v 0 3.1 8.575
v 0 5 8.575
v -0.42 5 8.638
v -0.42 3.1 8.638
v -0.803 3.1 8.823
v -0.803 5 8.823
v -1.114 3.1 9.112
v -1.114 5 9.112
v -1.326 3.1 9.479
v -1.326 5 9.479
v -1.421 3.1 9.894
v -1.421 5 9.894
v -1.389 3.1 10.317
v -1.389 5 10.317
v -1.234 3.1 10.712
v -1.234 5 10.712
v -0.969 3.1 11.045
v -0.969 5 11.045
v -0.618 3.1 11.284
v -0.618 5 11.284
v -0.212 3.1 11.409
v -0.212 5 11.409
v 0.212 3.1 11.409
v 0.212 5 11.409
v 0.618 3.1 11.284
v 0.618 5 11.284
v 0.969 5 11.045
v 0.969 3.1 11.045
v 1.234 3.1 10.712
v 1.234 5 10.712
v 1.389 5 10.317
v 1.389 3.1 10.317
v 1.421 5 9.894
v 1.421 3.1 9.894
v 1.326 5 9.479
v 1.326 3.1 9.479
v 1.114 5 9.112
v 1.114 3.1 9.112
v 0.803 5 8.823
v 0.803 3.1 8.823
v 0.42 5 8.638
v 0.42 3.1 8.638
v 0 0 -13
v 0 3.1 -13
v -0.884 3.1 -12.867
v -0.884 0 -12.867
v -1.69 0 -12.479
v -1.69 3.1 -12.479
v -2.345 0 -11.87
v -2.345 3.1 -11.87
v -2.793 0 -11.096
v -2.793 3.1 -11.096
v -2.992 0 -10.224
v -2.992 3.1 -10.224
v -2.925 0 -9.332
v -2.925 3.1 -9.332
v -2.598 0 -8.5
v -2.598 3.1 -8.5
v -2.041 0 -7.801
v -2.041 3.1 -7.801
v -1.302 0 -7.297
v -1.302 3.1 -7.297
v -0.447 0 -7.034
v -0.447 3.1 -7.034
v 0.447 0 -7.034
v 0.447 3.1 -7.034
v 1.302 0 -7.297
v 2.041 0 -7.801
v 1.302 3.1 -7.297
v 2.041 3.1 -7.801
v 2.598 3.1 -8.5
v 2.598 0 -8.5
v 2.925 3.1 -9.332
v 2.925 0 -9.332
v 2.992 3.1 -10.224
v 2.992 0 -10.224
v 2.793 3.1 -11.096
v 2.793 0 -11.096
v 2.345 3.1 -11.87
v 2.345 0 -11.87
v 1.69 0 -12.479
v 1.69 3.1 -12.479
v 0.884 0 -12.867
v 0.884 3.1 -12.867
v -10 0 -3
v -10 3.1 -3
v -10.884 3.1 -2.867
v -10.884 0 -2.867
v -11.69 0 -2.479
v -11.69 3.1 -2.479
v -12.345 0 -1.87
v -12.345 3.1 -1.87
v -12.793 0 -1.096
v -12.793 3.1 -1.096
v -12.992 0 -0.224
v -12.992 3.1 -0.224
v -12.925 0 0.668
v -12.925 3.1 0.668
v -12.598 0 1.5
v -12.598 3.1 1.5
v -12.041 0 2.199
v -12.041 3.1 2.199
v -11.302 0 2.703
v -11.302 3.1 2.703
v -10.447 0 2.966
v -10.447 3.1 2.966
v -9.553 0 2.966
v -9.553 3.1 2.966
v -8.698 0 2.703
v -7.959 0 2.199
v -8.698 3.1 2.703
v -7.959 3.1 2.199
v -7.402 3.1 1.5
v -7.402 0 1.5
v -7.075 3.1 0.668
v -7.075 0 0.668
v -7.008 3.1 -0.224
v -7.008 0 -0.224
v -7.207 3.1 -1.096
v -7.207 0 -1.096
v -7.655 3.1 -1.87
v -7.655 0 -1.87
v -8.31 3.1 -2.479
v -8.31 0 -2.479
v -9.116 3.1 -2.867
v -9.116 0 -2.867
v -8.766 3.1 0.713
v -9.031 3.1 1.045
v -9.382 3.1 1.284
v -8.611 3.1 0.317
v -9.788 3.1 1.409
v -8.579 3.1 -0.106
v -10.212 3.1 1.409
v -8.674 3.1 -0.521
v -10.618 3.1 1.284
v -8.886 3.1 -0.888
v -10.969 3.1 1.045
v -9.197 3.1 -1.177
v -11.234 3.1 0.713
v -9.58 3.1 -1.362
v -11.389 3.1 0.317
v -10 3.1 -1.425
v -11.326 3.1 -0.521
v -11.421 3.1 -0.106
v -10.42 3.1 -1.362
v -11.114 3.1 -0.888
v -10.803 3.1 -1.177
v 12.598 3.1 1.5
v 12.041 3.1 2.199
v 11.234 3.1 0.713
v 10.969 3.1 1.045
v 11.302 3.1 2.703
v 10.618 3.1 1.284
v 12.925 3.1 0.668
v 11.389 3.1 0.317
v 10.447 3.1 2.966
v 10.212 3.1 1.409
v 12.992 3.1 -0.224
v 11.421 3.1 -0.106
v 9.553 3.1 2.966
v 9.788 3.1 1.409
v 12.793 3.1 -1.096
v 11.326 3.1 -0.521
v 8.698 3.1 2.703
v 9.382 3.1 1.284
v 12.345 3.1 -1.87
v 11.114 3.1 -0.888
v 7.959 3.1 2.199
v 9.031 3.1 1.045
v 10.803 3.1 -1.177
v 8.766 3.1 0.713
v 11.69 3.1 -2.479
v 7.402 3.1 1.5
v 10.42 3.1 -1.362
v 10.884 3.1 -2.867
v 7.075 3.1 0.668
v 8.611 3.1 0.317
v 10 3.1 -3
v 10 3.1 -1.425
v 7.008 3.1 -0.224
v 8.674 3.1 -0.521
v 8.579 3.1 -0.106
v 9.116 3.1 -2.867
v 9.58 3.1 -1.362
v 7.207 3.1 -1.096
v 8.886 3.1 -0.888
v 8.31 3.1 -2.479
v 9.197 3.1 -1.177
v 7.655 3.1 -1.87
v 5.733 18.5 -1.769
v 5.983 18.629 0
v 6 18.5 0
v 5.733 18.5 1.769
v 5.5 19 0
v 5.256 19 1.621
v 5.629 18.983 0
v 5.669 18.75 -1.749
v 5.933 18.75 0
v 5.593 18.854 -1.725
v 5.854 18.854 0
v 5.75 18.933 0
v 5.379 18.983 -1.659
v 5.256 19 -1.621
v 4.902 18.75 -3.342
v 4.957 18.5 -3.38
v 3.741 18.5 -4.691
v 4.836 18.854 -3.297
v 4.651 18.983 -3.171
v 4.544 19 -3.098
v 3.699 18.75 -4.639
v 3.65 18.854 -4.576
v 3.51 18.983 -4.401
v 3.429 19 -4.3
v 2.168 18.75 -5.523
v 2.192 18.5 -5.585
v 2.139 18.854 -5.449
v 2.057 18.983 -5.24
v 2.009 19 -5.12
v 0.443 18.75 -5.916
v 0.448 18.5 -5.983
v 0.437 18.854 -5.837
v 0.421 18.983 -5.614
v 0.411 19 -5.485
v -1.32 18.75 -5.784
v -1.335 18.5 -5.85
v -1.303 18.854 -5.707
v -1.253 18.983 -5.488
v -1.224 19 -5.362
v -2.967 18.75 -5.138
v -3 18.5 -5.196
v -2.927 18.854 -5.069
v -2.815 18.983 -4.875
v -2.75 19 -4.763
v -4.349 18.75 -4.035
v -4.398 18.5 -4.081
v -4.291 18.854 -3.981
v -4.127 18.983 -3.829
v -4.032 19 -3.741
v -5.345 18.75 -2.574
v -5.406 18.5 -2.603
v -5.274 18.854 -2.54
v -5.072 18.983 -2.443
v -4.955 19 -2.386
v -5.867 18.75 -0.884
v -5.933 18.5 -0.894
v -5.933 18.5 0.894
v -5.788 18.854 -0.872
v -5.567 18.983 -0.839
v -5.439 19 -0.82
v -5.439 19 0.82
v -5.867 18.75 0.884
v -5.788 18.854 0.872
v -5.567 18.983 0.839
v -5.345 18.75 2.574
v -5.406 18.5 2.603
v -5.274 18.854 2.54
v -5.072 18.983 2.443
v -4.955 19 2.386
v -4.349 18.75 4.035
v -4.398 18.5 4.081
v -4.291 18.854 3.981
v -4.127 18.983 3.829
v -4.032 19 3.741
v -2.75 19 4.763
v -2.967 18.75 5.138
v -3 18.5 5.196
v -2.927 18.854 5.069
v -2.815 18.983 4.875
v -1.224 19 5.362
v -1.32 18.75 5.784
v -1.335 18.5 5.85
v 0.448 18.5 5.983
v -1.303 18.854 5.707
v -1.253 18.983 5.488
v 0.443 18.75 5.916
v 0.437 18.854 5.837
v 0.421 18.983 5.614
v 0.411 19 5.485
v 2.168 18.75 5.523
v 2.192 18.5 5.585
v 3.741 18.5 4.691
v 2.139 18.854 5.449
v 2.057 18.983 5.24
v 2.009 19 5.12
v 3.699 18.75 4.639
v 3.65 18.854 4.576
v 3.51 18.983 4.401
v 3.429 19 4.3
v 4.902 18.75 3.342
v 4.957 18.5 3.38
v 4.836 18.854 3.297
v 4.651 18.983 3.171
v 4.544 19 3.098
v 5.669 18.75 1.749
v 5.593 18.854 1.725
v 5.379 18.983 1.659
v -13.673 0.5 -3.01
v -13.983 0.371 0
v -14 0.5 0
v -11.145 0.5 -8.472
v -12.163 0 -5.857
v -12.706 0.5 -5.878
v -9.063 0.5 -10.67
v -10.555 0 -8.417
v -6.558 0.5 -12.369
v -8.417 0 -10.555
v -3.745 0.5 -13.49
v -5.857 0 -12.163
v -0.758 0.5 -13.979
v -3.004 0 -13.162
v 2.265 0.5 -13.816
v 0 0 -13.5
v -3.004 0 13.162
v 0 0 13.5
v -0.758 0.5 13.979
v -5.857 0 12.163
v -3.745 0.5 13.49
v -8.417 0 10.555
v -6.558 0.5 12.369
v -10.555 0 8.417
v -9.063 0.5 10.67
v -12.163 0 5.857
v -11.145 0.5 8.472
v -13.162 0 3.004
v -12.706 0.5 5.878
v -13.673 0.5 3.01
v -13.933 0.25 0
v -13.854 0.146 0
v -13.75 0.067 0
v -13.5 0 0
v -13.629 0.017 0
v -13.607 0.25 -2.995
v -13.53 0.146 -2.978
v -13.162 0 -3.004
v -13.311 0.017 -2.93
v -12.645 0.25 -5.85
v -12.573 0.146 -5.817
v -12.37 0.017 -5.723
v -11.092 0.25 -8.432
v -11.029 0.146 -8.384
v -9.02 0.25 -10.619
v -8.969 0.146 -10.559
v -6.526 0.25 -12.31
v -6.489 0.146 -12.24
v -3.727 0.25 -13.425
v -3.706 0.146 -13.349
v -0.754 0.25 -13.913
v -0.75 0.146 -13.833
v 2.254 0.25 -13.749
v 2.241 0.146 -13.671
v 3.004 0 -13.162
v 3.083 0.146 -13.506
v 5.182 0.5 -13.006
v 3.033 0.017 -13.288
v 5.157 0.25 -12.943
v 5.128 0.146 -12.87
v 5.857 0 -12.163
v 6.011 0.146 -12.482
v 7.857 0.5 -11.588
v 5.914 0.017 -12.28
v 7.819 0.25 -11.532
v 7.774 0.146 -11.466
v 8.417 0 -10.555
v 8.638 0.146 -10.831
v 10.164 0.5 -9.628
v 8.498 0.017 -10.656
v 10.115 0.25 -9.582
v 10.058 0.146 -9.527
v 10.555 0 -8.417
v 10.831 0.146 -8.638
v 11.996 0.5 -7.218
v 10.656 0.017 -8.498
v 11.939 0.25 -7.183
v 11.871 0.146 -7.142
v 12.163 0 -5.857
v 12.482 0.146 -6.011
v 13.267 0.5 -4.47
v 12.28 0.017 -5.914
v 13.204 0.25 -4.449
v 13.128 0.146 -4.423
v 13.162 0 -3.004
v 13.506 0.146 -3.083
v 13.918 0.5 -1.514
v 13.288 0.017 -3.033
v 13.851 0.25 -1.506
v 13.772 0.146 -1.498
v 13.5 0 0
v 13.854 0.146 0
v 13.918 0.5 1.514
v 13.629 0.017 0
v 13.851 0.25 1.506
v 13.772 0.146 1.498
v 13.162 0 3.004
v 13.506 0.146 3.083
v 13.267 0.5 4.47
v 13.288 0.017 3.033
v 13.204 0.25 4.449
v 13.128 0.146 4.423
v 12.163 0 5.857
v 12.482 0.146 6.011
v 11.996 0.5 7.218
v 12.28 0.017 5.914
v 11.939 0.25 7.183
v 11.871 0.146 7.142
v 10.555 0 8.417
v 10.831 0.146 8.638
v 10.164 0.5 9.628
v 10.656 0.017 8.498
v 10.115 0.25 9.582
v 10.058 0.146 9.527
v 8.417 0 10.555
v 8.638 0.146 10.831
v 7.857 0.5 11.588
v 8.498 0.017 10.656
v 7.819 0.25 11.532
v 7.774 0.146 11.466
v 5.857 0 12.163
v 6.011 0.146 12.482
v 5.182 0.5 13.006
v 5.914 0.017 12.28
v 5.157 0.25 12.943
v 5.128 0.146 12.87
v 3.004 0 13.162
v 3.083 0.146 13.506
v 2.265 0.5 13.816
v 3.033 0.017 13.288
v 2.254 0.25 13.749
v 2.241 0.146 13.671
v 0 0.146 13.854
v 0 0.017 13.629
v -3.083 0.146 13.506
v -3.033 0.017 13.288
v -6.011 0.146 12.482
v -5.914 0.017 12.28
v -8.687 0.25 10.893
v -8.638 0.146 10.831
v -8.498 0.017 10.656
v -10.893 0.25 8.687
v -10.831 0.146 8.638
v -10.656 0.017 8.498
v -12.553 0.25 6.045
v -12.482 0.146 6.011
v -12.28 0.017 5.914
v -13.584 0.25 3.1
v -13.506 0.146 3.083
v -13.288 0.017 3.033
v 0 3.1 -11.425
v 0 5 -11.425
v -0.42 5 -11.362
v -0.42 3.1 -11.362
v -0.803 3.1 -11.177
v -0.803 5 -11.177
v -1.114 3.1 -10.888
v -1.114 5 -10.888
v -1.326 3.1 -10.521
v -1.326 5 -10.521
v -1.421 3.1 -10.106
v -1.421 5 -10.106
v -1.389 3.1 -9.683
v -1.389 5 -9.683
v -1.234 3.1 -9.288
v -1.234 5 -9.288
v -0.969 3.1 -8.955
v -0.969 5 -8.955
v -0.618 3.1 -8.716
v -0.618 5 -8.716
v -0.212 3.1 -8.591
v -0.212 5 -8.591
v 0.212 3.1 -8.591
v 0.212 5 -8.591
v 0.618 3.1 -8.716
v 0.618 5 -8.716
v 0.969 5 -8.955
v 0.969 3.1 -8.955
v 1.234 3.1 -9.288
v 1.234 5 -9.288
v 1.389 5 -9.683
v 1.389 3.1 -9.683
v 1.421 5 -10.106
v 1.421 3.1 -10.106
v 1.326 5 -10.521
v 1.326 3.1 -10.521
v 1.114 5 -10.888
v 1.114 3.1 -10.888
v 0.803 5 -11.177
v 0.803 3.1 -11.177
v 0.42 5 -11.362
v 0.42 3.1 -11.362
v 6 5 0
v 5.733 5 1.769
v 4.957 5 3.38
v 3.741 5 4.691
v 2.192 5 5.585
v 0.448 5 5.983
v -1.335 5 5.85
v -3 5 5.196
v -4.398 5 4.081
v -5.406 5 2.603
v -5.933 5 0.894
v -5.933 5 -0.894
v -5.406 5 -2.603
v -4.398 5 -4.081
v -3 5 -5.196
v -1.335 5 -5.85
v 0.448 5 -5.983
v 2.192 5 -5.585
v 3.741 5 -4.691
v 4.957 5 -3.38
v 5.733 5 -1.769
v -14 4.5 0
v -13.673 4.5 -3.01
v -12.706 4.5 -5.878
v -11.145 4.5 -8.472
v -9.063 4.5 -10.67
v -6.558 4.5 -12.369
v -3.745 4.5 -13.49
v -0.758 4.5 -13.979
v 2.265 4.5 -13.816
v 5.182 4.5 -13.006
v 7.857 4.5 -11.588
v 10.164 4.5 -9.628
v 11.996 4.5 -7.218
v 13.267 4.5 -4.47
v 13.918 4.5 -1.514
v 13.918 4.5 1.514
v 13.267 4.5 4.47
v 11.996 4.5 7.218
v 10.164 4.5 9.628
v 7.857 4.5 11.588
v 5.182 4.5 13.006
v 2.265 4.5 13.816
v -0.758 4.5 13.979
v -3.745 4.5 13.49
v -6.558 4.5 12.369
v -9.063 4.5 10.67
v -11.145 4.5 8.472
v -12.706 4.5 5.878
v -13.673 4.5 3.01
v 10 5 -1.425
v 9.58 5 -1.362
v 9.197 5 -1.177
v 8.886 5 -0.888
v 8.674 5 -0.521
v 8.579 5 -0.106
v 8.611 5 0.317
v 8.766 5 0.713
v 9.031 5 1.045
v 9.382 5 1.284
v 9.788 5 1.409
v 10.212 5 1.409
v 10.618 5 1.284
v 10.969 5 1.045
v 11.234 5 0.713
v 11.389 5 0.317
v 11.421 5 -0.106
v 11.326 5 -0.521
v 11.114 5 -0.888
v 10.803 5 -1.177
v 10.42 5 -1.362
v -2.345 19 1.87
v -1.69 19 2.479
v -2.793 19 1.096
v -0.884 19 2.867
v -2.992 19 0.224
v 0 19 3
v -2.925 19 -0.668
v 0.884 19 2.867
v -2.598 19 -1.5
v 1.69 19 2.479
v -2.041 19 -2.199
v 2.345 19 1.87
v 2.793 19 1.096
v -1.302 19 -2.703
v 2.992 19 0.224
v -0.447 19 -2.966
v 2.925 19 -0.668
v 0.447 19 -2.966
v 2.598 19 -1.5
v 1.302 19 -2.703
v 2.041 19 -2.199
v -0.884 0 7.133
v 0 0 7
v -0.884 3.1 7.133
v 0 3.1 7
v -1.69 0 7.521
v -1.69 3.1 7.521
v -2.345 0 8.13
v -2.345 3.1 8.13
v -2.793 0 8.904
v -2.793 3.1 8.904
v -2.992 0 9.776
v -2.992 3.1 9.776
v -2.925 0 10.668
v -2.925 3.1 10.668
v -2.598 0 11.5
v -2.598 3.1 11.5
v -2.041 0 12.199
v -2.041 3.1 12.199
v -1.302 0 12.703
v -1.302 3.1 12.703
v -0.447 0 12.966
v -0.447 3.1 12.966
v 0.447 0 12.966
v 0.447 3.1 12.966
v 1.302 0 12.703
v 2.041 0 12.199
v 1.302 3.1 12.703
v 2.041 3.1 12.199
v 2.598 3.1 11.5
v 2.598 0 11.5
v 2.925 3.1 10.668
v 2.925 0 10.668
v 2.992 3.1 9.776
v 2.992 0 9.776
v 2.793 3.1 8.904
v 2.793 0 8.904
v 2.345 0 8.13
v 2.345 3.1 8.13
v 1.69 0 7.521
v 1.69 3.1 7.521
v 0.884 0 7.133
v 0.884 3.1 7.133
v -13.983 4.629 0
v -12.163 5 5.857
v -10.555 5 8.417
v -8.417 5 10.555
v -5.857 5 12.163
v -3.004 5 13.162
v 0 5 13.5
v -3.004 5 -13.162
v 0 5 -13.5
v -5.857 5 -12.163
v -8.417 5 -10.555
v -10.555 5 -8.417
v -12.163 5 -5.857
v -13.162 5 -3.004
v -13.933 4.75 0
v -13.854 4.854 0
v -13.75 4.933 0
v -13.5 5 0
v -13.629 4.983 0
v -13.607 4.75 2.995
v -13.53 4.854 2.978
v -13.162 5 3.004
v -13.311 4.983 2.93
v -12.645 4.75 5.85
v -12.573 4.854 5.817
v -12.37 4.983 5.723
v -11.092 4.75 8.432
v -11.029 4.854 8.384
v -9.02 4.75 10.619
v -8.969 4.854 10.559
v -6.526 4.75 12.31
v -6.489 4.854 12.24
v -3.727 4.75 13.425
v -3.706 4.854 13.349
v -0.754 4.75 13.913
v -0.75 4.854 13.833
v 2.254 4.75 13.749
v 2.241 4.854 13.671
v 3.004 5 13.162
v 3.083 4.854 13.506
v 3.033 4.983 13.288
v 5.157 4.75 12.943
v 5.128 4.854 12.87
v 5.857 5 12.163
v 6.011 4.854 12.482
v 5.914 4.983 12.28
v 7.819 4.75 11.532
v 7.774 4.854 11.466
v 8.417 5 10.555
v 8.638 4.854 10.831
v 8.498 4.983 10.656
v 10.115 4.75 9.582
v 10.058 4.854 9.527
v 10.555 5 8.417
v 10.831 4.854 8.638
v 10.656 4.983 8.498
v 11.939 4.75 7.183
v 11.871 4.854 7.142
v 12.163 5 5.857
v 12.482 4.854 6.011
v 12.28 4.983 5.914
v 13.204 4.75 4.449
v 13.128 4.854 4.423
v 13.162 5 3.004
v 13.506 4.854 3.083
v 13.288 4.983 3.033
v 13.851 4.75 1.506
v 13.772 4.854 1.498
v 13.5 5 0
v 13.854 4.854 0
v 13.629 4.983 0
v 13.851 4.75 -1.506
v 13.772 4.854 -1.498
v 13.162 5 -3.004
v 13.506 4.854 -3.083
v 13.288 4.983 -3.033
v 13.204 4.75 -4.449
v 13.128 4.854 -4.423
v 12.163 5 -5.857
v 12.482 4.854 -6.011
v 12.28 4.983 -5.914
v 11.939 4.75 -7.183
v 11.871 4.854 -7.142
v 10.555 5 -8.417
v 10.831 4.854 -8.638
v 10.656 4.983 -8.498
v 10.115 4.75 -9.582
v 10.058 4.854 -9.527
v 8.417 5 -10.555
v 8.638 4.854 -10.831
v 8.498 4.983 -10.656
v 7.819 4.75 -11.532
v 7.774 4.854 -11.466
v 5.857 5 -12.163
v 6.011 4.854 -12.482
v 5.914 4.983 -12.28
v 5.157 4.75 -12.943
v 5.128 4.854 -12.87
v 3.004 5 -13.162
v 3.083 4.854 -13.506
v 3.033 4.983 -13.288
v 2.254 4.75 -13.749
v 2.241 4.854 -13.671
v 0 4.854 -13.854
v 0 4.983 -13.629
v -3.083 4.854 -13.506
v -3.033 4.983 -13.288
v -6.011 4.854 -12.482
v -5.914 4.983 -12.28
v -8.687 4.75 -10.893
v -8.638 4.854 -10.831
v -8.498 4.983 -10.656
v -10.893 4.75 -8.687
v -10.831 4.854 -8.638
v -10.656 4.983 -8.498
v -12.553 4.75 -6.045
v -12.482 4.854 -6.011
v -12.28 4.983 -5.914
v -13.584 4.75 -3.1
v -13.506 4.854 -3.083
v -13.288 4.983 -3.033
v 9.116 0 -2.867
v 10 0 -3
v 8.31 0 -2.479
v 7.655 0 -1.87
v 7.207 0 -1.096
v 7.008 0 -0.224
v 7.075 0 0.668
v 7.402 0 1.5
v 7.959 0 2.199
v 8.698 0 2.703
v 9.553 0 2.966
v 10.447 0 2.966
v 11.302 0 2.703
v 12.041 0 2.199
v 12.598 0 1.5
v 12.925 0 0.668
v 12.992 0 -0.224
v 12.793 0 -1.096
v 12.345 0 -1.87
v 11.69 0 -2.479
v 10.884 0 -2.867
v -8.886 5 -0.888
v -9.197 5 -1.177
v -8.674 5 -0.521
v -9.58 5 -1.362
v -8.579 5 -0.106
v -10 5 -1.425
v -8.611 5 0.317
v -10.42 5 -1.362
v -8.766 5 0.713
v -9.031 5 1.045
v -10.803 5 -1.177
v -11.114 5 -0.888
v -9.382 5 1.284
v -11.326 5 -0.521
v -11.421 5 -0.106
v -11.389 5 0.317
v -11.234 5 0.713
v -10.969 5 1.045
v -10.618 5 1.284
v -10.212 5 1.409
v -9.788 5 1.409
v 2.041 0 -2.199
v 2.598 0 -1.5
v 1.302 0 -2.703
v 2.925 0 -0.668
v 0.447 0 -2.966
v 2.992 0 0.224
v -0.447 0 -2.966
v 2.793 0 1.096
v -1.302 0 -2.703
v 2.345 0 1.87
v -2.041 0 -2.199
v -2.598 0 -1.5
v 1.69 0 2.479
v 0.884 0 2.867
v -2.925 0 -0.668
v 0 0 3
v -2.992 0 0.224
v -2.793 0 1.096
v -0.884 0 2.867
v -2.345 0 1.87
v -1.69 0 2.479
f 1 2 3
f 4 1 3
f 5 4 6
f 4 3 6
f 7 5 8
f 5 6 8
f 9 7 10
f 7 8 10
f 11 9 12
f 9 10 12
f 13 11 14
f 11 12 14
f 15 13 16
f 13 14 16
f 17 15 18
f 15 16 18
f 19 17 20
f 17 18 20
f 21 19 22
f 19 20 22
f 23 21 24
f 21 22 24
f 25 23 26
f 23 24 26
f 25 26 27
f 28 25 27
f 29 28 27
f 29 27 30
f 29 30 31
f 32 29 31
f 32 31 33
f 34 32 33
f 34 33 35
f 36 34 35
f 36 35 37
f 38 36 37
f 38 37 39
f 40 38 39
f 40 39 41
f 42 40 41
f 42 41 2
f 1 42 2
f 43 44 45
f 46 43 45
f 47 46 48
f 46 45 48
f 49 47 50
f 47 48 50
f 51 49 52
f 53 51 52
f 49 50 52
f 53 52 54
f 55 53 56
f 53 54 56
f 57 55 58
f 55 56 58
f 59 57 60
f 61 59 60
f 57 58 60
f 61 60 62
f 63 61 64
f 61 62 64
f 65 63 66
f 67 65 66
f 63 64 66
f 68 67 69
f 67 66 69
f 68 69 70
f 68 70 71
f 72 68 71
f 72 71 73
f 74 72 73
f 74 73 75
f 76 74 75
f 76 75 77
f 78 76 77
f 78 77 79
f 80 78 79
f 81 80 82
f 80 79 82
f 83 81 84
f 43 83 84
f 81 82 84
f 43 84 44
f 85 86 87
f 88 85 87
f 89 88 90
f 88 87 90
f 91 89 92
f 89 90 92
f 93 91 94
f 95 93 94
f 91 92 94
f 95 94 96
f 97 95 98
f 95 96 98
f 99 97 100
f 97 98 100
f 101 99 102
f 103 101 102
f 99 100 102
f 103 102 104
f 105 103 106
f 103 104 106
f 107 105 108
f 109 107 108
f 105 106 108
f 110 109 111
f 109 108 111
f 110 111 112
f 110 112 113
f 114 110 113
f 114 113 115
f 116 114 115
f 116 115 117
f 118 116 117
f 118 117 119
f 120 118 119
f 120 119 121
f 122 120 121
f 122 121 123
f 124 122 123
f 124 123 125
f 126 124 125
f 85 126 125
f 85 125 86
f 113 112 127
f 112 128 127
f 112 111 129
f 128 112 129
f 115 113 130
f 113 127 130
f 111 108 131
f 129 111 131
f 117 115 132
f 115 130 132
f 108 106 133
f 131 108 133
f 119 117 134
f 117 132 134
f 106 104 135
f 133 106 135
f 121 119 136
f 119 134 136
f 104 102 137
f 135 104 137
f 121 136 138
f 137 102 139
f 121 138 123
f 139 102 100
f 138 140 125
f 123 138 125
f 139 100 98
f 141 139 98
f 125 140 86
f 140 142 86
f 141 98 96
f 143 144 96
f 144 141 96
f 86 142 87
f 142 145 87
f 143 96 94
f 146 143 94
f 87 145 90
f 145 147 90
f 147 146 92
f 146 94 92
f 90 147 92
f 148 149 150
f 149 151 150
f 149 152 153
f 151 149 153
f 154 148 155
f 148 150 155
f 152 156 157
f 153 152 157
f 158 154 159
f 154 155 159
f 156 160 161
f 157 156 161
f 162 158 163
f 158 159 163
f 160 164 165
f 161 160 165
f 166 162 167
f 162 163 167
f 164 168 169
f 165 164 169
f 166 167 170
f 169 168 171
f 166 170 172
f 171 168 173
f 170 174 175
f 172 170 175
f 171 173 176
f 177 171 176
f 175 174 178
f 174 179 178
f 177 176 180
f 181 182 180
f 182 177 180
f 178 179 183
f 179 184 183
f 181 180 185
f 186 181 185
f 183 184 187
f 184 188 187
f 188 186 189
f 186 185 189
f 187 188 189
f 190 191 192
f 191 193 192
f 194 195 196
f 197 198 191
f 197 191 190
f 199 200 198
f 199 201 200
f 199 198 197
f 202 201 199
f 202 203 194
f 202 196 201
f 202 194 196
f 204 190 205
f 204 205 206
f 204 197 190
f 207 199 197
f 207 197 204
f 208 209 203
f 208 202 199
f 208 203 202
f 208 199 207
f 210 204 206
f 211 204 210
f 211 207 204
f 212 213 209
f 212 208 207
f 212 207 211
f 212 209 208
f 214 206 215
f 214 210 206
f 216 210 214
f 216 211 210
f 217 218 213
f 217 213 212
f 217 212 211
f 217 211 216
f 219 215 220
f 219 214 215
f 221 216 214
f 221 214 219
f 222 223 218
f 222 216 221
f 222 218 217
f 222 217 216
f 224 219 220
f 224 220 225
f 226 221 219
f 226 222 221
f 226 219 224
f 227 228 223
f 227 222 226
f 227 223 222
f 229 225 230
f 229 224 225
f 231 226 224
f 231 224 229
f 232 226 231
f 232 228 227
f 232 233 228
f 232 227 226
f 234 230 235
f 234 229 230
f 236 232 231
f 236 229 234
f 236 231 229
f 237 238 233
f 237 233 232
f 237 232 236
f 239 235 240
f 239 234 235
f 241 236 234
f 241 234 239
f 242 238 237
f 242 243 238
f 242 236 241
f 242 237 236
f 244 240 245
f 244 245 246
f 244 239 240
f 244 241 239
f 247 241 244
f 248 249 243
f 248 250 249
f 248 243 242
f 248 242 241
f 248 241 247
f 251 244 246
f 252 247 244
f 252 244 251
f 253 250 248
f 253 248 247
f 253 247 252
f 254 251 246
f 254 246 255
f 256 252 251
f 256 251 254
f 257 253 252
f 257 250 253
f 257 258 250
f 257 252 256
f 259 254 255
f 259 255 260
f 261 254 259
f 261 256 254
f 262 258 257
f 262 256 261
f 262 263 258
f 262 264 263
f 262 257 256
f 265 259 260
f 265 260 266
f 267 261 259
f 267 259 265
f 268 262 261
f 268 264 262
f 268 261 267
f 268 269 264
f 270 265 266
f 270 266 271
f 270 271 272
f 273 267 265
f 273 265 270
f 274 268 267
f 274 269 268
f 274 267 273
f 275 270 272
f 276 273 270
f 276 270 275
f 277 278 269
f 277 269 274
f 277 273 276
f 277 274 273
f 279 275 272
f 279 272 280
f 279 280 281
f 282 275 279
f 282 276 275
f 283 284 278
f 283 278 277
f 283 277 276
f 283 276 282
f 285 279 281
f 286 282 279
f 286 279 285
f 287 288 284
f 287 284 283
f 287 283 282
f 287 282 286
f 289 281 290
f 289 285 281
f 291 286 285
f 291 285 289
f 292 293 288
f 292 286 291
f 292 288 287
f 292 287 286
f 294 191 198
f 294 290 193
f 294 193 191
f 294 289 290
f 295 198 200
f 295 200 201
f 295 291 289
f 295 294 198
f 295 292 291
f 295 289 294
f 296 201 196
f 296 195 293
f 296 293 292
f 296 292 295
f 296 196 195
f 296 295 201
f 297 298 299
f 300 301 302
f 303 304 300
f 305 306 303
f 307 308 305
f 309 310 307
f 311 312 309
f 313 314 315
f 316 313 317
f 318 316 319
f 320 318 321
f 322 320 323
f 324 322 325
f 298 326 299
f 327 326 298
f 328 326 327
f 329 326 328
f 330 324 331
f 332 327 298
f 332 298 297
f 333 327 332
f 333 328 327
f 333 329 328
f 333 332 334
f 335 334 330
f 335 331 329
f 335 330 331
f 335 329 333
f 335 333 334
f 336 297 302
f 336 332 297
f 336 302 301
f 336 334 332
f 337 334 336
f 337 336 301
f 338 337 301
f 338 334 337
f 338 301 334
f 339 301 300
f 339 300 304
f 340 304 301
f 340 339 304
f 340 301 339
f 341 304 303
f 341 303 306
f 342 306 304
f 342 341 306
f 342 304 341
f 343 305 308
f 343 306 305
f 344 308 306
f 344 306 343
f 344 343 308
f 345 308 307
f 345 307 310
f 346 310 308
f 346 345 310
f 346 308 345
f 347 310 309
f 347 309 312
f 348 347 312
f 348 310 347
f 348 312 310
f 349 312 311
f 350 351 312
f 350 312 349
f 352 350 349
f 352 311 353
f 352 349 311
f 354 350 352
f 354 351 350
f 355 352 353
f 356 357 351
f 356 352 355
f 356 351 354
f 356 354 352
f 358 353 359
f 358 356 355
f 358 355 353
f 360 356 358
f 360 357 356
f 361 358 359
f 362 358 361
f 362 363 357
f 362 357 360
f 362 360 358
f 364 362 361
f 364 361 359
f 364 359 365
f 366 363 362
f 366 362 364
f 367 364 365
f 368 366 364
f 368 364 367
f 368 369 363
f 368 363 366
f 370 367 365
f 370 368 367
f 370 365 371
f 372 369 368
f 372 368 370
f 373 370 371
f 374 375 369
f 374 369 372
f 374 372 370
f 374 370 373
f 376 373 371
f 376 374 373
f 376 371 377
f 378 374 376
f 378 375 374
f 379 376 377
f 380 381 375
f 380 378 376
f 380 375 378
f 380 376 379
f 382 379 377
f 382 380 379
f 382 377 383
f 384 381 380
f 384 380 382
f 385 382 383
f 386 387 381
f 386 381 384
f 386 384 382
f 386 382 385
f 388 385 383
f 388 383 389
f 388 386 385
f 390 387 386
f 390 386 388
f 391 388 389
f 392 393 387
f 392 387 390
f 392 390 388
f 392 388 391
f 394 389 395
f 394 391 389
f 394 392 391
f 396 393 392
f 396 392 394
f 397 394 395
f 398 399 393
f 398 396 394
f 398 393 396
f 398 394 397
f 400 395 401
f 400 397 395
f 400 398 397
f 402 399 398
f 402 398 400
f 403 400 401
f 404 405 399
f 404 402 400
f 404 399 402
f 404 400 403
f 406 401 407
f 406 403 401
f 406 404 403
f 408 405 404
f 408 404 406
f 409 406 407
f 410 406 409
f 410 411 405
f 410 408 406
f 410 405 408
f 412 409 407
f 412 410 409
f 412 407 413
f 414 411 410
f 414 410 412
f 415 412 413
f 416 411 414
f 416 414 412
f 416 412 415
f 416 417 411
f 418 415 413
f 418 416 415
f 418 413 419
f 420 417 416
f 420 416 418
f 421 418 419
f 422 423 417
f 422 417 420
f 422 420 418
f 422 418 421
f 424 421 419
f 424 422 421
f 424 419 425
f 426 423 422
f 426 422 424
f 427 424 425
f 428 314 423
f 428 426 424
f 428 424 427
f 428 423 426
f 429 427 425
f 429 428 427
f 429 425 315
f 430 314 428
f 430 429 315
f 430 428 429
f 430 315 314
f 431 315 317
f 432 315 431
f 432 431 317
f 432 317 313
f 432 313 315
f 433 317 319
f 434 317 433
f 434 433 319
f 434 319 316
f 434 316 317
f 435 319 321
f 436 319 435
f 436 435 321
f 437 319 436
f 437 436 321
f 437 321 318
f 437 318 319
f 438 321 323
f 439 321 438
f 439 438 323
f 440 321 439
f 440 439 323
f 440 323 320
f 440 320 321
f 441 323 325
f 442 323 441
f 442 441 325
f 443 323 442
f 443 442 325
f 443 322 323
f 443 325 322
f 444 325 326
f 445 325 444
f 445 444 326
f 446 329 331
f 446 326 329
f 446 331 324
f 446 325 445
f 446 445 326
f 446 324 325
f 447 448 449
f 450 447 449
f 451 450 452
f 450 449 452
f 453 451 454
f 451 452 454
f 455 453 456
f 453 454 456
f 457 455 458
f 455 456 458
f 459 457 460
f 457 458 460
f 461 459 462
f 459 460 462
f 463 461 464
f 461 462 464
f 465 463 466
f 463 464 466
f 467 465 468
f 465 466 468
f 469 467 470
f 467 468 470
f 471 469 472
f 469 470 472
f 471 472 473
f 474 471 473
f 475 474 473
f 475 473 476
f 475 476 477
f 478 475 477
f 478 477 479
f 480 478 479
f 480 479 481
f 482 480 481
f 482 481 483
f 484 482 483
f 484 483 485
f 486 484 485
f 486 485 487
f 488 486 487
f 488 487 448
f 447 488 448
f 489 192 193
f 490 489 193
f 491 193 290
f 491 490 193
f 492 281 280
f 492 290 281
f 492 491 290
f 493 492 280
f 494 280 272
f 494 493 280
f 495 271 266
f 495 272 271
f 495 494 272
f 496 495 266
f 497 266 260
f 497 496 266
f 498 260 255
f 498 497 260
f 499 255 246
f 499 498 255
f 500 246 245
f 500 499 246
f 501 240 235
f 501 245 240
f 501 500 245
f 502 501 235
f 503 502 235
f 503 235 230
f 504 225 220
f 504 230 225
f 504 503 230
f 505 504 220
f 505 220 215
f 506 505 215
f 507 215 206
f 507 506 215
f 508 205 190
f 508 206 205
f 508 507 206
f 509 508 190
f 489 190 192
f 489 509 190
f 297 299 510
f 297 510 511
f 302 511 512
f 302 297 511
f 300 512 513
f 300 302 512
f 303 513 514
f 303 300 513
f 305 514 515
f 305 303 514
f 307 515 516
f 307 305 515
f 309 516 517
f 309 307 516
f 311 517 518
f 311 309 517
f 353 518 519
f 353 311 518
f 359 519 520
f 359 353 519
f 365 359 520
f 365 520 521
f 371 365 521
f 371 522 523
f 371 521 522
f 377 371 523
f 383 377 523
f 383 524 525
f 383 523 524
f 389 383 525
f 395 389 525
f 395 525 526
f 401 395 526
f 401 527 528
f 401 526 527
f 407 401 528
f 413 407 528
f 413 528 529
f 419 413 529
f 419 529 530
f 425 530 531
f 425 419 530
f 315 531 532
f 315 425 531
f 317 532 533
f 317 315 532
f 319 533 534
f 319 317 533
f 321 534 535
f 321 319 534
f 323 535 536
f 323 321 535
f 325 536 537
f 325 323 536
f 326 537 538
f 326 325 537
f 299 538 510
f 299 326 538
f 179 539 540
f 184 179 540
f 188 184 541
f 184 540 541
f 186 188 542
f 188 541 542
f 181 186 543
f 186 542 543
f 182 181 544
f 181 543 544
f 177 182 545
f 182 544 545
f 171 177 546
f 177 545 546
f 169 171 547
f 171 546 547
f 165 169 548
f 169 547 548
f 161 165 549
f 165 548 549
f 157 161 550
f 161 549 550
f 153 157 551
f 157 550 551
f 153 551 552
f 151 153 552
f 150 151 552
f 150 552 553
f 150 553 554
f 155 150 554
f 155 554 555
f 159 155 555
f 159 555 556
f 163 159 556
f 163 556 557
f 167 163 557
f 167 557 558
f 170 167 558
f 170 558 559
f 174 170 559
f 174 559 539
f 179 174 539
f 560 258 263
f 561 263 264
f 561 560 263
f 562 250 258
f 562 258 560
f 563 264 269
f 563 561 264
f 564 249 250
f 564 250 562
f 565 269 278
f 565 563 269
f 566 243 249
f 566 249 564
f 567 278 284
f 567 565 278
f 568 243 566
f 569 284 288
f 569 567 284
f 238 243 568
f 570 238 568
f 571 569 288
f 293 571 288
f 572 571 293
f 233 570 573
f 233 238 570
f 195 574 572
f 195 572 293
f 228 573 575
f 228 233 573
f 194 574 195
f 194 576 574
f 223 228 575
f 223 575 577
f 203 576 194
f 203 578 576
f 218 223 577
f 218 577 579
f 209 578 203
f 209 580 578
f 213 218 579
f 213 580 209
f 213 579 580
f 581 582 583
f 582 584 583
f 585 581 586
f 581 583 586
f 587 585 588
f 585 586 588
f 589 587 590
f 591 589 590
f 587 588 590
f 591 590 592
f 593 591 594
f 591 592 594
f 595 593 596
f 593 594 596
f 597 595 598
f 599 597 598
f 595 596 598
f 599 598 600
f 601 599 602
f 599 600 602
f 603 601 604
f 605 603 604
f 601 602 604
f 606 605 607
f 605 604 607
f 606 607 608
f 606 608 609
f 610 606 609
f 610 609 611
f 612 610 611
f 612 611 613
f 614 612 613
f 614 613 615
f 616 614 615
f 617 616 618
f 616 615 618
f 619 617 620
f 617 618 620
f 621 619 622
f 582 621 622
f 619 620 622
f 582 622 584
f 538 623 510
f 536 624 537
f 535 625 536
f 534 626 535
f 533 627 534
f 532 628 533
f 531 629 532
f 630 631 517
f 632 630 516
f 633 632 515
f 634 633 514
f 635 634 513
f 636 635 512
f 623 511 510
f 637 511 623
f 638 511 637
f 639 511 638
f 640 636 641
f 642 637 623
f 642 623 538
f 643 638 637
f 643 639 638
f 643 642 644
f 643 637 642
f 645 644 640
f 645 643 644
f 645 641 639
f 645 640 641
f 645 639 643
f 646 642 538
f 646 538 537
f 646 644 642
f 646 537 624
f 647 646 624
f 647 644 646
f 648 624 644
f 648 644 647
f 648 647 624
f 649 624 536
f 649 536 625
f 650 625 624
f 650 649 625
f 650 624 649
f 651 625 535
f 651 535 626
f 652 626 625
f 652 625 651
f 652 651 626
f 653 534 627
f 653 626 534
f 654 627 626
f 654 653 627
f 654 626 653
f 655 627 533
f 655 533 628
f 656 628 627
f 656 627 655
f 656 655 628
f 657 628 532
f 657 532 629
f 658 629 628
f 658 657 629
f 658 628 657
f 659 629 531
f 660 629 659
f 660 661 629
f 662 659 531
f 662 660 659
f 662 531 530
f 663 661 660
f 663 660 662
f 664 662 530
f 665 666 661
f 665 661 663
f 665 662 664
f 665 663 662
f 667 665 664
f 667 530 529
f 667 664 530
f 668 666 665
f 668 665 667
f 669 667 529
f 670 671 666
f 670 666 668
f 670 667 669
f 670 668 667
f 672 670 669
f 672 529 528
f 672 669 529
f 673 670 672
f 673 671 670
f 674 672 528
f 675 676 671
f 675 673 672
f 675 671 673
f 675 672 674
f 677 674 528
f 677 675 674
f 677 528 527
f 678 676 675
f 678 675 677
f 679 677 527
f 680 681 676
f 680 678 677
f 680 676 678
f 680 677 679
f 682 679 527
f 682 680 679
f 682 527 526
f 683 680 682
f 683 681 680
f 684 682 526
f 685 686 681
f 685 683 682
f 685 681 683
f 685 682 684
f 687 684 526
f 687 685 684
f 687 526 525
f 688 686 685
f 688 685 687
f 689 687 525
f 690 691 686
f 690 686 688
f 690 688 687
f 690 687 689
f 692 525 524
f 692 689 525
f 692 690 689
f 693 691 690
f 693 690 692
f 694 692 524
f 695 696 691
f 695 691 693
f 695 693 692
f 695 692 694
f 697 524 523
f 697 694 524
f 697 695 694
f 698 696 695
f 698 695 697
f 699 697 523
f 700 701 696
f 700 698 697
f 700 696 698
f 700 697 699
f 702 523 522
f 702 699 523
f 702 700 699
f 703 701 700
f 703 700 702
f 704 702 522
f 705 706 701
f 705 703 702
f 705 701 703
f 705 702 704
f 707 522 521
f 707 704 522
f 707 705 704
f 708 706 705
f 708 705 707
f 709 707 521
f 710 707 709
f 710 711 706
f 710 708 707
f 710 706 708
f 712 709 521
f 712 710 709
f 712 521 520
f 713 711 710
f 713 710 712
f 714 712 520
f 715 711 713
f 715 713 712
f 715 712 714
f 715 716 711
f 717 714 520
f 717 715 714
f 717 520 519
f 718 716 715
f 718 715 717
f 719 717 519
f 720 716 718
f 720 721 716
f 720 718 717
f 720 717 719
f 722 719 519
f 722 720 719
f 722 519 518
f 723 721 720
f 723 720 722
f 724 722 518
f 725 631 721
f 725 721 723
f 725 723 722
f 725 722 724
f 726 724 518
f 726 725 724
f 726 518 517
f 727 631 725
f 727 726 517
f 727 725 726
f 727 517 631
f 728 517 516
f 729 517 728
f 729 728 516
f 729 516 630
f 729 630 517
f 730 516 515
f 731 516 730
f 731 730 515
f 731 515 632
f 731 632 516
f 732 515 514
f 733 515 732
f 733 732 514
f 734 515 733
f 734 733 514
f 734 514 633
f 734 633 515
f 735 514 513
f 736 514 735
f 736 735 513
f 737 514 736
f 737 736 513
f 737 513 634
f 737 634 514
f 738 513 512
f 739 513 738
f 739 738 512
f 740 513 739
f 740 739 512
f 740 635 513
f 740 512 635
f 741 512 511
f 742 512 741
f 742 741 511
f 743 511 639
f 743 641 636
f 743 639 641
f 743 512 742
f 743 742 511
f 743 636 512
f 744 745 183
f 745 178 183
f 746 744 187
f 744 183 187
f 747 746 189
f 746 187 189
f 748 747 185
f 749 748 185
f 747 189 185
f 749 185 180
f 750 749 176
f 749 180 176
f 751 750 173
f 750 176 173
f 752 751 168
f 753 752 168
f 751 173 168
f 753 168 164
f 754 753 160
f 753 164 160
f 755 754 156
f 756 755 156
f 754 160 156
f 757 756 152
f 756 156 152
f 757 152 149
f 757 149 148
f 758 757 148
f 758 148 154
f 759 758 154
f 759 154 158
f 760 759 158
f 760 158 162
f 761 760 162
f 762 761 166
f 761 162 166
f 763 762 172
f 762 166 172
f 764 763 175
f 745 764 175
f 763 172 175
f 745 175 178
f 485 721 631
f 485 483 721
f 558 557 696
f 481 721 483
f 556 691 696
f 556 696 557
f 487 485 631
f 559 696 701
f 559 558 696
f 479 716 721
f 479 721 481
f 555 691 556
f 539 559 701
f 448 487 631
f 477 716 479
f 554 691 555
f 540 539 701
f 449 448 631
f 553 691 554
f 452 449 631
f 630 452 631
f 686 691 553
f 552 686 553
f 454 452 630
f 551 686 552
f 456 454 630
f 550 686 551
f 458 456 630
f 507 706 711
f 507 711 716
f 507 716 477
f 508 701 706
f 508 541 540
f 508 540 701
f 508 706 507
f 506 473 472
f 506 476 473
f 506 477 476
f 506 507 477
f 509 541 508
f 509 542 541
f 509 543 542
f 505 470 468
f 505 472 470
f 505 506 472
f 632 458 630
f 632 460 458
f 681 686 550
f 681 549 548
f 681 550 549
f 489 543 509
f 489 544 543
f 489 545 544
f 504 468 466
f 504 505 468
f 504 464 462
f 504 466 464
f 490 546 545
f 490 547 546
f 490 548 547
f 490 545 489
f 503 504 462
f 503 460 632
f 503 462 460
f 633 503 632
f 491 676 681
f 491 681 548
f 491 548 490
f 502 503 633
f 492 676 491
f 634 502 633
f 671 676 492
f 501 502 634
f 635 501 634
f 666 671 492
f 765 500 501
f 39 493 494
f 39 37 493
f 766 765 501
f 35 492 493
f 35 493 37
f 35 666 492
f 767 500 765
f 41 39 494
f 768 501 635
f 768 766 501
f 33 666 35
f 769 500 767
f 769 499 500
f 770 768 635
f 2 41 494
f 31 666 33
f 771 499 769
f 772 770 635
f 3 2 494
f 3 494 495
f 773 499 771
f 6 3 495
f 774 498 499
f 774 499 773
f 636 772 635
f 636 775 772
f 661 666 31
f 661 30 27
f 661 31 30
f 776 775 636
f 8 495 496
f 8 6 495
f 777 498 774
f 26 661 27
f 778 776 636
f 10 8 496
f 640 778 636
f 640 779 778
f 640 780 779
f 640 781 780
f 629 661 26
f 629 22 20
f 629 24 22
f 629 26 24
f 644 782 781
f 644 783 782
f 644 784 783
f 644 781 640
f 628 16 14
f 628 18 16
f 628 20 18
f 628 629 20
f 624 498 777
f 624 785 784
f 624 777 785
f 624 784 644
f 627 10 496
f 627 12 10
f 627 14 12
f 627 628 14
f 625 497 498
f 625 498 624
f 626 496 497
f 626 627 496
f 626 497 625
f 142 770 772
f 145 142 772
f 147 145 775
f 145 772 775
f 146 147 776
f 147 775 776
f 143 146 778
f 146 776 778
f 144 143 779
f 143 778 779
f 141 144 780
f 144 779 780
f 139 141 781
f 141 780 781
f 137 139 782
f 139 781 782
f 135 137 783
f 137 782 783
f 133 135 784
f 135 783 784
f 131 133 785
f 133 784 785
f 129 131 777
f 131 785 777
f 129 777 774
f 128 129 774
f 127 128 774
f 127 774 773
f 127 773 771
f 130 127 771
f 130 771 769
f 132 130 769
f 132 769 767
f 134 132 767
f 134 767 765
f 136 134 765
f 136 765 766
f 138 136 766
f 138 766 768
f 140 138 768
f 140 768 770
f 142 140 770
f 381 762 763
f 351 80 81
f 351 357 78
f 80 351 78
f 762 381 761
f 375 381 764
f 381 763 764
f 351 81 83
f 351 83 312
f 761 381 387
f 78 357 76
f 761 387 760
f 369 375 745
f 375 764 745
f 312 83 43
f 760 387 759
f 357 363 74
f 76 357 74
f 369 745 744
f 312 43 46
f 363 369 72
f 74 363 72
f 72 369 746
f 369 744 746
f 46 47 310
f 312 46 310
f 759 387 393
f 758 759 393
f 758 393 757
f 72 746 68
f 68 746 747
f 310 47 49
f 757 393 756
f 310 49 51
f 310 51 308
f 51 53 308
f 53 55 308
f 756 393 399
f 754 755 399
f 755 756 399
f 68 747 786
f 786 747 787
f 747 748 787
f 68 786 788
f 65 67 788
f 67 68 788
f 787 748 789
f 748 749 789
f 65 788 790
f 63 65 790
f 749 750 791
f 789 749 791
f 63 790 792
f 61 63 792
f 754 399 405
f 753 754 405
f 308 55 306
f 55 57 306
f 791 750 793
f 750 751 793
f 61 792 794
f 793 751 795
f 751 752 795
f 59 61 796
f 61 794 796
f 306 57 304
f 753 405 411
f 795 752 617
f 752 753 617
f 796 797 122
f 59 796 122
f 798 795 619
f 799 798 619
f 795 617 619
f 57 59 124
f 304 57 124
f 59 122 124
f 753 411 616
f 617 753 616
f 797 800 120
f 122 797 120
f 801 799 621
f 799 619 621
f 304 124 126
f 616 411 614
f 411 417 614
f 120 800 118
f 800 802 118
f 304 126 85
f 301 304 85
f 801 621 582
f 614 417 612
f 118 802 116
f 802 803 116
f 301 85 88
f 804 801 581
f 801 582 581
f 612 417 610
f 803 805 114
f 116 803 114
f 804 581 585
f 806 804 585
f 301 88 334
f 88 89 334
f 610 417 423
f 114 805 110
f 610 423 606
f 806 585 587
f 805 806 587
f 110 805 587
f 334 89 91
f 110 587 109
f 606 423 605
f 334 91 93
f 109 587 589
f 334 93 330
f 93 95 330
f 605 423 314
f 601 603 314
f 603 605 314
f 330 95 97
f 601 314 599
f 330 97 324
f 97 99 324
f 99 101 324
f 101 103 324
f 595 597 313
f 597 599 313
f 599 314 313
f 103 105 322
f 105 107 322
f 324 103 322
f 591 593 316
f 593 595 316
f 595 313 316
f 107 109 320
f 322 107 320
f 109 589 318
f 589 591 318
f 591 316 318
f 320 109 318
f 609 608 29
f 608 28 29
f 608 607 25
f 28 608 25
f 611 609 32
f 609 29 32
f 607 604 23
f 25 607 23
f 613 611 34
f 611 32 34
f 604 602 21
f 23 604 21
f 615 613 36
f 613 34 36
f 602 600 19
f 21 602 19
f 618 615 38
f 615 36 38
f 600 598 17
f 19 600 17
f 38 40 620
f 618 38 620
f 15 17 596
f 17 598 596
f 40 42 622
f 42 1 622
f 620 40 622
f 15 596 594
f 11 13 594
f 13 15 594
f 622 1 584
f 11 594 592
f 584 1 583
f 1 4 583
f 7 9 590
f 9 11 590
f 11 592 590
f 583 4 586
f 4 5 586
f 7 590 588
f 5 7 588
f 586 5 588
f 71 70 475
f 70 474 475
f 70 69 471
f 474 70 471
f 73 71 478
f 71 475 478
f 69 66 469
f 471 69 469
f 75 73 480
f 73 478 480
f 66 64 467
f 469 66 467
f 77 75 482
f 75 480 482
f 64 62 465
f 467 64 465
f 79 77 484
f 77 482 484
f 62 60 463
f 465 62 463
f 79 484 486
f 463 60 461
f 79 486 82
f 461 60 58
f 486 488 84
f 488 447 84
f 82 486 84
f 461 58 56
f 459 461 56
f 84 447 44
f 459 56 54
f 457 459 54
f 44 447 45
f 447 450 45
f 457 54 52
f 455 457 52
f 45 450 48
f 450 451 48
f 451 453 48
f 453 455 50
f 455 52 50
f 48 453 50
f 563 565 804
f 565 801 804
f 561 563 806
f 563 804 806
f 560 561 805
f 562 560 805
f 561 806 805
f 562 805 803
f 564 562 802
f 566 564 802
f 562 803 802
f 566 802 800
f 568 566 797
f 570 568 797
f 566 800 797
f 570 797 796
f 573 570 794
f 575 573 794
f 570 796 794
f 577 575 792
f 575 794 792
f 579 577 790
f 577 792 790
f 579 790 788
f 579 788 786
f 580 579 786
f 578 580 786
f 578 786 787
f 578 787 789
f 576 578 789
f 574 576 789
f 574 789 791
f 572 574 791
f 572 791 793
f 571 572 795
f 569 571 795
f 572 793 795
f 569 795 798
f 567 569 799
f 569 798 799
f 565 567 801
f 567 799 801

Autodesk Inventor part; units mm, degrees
ref_plane "YZ Plane" through (0, 0, 0) normal (1, 0, 0) x (0, 1, 0)
ref_plane "XZ Plane" through (0, 0, 0) normal (0, 1, 0) x (-1, 0, 0)
ref_plane "XY Plane" through (0, 0, 0) normal (0, 0, 1) x (1, 0, 0)
sketch "Sketch1" plane through (0, 0, 0) normal (0, 1, 0) x (-1, 0, 0)
  circle A0 centre (0, 0) radius 14
  dimension "d0" = 28
extrude "Extrusion1" add sketch "Sketch1" along normal blind 5
sketch "Sketch2" plane through (0, 5, 0) normal (0, 1, 0) x (1, 0, 0)
  circle A0 centre (0, 0) radius 6
  dimension "d3" = 12
extrude "Extrusion2" add sketch "Sketch2" along normal blind 14
sketch "Sketch4" plane through (0, 0, 0) normal (0, -1, 0) x (1, 0, 0)
  circle A0 centre (0, 0) radius 10 construction
  point P0 (0, -10)
  point P1 (0, 10)
  point P2 (-10, 0)
  point P3 (10, 0)
  dimension "d7" = 20
hole "Hole1" at (0, 0, -10) at (0, 0, 10) at (-10, 0, 0) at (10, 0, 0) direction (0, 1, 0) diameter 2.85 end through all counterbore diameter 6 counterbore depth 3.1 thread size "M3.5x0.6" class "6H" standard "ISO Metric profile"
sketch "Sketch5" plane through (0, 19, 0) normal (0, 1, 0) x (1, 0, 0)
  point P0 (0, 0)
  point P1 (0, 0)
  dimension "d6" = 20
hole "Hole2" at (0, 19, 0) direction (0, -1, 0) diameter 6 end through all
fillet "Fillet1" radius 0.5 3 edges at (-6, 19, 0) (14, 5, 0) (14, 0, 0)
properties part number "2309HCMUTE-CDT23-BAC_TRUOT" material "Stainless Steel"
